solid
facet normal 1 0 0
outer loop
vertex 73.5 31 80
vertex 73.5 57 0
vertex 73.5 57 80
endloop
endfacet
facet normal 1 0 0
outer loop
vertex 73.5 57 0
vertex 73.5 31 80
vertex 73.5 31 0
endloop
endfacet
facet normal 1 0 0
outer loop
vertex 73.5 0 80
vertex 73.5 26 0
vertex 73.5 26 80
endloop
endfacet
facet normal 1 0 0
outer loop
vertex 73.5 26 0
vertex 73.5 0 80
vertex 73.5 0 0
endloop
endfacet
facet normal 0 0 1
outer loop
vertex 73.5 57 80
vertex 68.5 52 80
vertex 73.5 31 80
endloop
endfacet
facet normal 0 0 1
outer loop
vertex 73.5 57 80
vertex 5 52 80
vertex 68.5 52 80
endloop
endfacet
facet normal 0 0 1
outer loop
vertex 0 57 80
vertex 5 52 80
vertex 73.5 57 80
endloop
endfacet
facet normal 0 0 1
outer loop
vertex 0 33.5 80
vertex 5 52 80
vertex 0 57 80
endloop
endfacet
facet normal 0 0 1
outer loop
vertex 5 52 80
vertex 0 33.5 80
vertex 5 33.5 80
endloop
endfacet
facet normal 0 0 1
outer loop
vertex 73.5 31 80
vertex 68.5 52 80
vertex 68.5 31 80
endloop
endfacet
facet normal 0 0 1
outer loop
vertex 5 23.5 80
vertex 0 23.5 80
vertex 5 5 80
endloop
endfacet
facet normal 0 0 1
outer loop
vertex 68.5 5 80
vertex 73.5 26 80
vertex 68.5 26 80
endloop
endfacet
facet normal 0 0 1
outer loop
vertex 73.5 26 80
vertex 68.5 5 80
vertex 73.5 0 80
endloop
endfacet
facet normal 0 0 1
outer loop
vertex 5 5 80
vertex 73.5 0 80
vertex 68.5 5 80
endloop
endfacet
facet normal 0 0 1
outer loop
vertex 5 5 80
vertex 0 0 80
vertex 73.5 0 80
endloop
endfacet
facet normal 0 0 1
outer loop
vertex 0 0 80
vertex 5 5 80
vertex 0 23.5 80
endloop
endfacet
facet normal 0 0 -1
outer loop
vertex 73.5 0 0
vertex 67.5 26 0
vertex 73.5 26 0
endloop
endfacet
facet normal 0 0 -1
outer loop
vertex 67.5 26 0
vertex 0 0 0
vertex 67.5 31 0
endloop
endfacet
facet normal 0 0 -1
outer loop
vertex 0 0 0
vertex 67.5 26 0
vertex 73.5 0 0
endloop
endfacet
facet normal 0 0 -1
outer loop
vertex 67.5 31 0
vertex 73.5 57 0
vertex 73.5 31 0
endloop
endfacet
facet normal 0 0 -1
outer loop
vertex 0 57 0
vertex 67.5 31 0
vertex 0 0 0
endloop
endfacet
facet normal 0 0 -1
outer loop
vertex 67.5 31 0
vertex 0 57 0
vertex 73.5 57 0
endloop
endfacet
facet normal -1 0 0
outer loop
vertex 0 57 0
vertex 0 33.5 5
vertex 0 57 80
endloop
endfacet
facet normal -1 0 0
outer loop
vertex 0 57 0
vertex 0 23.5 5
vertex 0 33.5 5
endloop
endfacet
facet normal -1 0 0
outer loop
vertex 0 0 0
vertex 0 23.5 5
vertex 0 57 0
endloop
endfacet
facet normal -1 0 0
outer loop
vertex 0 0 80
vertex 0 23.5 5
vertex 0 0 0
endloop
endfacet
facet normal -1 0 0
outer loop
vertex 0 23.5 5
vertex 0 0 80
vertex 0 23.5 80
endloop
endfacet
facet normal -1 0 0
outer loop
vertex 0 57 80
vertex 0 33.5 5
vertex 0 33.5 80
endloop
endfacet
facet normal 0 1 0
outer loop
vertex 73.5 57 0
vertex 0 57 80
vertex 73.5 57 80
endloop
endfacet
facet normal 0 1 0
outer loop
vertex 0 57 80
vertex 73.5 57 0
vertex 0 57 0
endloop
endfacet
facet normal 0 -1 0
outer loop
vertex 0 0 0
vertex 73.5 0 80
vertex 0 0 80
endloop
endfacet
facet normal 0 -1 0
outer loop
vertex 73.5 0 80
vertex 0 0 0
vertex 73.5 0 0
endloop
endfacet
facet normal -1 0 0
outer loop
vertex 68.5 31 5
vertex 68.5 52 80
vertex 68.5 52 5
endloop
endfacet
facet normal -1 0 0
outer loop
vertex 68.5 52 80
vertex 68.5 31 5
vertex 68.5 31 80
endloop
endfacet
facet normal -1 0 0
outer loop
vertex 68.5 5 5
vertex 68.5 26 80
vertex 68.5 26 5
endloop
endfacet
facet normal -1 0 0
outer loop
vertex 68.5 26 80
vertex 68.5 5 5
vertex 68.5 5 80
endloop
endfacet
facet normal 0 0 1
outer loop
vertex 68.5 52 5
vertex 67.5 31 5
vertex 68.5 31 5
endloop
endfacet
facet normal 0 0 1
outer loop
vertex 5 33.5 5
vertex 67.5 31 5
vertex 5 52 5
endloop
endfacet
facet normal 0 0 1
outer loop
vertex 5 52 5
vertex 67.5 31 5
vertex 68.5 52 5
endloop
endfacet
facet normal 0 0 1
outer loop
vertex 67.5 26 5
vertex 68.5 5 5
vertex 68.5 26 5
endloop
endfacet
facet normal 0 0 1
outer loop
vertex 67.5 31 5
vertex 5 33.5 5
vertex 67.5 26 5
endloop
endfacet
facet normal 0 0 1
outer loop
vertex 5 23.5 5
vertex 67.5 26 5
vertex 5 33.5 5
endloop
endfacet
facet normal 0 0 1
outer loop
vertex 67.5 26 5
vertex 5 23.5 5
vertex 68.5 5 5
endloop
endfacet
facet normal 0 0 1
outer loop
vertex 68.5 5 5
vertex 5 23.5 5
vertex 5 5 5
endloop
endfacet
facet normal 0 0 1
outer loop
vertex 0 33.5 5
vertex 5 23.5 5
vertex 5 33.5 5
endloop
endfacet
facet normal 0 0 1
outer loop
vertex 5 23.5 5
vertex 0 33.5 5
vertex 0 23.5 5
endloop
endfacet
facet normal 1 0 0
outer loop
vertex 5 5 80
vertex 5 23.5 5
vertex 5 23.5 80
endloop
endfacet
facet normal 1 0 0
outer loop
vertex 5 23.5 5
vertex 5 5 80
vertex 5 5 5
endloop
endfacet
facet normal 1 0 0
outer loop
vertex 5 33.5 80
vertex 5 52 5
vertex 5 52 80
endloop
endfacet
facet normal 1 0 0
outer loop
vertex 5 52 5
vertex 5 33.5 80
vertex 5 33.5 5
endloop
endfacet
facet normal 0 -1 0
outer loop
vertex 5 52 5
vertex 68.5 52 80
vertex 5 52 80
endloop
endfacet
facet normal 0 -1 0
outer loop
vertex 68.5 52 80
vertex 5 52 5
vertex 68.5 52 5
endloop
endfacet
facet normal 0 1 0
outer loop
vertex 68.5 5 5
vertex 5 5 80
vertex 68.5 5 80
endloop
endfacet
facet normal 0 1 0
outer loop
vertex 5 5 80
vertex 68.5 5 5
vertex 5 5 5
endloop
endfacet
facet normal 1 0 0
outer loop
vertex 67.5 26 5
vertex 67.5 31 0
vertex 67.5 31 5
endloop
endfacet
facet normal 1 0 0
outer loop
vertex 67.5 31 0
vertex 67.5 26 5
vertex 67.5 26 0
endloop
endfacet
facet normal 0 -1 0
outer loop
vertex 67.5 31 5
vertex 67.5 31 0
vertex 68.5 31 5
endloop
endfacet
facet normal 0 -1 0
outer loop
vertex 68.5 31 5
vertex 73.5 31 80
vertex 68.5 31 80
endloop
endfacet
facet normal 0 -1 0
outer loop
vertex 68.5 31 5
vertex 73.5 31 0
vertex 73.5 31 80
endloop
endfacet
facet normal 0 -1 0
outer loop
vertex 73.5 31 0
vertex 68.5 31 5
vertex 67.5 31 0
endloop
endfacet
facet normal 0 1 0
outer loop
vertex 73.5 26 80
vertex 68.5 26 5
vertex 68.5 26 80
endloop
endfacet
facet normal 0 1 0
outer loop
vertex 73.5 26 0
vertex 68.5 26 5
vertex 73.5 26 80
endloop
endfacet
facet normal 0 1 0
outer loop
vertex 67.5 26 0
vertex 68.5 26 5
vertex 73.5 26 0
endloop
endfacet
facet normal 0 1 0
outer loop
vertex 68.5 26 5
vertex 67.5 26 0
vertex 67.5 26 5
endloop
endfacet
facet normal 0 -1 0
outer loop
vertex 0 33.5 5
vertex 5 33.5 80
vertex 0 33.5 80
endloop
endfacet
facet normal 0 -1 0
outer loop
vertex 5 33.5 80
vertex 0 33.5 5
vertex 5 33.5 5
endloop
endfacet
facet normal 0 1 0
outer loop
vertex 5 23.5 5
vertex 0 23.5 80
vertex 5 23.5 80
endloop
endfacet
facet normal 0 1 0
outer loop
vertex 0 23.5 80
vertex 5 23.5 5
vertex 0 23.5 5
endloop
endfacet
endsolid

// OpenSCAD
l = 63.5;
w = 47;
h = 80;

hh = 24;

difference() {
    cube([l+10,w+10,h]);
    
    translate([5,5,5])
        cube([l,w,h+10]);
    
    translate([l+4,w/2+2.5,-1])
        cube([l, 5, h+2]);
    
    translate([-1,w/2,5])
        cube([l, 10, h+2]);

}
